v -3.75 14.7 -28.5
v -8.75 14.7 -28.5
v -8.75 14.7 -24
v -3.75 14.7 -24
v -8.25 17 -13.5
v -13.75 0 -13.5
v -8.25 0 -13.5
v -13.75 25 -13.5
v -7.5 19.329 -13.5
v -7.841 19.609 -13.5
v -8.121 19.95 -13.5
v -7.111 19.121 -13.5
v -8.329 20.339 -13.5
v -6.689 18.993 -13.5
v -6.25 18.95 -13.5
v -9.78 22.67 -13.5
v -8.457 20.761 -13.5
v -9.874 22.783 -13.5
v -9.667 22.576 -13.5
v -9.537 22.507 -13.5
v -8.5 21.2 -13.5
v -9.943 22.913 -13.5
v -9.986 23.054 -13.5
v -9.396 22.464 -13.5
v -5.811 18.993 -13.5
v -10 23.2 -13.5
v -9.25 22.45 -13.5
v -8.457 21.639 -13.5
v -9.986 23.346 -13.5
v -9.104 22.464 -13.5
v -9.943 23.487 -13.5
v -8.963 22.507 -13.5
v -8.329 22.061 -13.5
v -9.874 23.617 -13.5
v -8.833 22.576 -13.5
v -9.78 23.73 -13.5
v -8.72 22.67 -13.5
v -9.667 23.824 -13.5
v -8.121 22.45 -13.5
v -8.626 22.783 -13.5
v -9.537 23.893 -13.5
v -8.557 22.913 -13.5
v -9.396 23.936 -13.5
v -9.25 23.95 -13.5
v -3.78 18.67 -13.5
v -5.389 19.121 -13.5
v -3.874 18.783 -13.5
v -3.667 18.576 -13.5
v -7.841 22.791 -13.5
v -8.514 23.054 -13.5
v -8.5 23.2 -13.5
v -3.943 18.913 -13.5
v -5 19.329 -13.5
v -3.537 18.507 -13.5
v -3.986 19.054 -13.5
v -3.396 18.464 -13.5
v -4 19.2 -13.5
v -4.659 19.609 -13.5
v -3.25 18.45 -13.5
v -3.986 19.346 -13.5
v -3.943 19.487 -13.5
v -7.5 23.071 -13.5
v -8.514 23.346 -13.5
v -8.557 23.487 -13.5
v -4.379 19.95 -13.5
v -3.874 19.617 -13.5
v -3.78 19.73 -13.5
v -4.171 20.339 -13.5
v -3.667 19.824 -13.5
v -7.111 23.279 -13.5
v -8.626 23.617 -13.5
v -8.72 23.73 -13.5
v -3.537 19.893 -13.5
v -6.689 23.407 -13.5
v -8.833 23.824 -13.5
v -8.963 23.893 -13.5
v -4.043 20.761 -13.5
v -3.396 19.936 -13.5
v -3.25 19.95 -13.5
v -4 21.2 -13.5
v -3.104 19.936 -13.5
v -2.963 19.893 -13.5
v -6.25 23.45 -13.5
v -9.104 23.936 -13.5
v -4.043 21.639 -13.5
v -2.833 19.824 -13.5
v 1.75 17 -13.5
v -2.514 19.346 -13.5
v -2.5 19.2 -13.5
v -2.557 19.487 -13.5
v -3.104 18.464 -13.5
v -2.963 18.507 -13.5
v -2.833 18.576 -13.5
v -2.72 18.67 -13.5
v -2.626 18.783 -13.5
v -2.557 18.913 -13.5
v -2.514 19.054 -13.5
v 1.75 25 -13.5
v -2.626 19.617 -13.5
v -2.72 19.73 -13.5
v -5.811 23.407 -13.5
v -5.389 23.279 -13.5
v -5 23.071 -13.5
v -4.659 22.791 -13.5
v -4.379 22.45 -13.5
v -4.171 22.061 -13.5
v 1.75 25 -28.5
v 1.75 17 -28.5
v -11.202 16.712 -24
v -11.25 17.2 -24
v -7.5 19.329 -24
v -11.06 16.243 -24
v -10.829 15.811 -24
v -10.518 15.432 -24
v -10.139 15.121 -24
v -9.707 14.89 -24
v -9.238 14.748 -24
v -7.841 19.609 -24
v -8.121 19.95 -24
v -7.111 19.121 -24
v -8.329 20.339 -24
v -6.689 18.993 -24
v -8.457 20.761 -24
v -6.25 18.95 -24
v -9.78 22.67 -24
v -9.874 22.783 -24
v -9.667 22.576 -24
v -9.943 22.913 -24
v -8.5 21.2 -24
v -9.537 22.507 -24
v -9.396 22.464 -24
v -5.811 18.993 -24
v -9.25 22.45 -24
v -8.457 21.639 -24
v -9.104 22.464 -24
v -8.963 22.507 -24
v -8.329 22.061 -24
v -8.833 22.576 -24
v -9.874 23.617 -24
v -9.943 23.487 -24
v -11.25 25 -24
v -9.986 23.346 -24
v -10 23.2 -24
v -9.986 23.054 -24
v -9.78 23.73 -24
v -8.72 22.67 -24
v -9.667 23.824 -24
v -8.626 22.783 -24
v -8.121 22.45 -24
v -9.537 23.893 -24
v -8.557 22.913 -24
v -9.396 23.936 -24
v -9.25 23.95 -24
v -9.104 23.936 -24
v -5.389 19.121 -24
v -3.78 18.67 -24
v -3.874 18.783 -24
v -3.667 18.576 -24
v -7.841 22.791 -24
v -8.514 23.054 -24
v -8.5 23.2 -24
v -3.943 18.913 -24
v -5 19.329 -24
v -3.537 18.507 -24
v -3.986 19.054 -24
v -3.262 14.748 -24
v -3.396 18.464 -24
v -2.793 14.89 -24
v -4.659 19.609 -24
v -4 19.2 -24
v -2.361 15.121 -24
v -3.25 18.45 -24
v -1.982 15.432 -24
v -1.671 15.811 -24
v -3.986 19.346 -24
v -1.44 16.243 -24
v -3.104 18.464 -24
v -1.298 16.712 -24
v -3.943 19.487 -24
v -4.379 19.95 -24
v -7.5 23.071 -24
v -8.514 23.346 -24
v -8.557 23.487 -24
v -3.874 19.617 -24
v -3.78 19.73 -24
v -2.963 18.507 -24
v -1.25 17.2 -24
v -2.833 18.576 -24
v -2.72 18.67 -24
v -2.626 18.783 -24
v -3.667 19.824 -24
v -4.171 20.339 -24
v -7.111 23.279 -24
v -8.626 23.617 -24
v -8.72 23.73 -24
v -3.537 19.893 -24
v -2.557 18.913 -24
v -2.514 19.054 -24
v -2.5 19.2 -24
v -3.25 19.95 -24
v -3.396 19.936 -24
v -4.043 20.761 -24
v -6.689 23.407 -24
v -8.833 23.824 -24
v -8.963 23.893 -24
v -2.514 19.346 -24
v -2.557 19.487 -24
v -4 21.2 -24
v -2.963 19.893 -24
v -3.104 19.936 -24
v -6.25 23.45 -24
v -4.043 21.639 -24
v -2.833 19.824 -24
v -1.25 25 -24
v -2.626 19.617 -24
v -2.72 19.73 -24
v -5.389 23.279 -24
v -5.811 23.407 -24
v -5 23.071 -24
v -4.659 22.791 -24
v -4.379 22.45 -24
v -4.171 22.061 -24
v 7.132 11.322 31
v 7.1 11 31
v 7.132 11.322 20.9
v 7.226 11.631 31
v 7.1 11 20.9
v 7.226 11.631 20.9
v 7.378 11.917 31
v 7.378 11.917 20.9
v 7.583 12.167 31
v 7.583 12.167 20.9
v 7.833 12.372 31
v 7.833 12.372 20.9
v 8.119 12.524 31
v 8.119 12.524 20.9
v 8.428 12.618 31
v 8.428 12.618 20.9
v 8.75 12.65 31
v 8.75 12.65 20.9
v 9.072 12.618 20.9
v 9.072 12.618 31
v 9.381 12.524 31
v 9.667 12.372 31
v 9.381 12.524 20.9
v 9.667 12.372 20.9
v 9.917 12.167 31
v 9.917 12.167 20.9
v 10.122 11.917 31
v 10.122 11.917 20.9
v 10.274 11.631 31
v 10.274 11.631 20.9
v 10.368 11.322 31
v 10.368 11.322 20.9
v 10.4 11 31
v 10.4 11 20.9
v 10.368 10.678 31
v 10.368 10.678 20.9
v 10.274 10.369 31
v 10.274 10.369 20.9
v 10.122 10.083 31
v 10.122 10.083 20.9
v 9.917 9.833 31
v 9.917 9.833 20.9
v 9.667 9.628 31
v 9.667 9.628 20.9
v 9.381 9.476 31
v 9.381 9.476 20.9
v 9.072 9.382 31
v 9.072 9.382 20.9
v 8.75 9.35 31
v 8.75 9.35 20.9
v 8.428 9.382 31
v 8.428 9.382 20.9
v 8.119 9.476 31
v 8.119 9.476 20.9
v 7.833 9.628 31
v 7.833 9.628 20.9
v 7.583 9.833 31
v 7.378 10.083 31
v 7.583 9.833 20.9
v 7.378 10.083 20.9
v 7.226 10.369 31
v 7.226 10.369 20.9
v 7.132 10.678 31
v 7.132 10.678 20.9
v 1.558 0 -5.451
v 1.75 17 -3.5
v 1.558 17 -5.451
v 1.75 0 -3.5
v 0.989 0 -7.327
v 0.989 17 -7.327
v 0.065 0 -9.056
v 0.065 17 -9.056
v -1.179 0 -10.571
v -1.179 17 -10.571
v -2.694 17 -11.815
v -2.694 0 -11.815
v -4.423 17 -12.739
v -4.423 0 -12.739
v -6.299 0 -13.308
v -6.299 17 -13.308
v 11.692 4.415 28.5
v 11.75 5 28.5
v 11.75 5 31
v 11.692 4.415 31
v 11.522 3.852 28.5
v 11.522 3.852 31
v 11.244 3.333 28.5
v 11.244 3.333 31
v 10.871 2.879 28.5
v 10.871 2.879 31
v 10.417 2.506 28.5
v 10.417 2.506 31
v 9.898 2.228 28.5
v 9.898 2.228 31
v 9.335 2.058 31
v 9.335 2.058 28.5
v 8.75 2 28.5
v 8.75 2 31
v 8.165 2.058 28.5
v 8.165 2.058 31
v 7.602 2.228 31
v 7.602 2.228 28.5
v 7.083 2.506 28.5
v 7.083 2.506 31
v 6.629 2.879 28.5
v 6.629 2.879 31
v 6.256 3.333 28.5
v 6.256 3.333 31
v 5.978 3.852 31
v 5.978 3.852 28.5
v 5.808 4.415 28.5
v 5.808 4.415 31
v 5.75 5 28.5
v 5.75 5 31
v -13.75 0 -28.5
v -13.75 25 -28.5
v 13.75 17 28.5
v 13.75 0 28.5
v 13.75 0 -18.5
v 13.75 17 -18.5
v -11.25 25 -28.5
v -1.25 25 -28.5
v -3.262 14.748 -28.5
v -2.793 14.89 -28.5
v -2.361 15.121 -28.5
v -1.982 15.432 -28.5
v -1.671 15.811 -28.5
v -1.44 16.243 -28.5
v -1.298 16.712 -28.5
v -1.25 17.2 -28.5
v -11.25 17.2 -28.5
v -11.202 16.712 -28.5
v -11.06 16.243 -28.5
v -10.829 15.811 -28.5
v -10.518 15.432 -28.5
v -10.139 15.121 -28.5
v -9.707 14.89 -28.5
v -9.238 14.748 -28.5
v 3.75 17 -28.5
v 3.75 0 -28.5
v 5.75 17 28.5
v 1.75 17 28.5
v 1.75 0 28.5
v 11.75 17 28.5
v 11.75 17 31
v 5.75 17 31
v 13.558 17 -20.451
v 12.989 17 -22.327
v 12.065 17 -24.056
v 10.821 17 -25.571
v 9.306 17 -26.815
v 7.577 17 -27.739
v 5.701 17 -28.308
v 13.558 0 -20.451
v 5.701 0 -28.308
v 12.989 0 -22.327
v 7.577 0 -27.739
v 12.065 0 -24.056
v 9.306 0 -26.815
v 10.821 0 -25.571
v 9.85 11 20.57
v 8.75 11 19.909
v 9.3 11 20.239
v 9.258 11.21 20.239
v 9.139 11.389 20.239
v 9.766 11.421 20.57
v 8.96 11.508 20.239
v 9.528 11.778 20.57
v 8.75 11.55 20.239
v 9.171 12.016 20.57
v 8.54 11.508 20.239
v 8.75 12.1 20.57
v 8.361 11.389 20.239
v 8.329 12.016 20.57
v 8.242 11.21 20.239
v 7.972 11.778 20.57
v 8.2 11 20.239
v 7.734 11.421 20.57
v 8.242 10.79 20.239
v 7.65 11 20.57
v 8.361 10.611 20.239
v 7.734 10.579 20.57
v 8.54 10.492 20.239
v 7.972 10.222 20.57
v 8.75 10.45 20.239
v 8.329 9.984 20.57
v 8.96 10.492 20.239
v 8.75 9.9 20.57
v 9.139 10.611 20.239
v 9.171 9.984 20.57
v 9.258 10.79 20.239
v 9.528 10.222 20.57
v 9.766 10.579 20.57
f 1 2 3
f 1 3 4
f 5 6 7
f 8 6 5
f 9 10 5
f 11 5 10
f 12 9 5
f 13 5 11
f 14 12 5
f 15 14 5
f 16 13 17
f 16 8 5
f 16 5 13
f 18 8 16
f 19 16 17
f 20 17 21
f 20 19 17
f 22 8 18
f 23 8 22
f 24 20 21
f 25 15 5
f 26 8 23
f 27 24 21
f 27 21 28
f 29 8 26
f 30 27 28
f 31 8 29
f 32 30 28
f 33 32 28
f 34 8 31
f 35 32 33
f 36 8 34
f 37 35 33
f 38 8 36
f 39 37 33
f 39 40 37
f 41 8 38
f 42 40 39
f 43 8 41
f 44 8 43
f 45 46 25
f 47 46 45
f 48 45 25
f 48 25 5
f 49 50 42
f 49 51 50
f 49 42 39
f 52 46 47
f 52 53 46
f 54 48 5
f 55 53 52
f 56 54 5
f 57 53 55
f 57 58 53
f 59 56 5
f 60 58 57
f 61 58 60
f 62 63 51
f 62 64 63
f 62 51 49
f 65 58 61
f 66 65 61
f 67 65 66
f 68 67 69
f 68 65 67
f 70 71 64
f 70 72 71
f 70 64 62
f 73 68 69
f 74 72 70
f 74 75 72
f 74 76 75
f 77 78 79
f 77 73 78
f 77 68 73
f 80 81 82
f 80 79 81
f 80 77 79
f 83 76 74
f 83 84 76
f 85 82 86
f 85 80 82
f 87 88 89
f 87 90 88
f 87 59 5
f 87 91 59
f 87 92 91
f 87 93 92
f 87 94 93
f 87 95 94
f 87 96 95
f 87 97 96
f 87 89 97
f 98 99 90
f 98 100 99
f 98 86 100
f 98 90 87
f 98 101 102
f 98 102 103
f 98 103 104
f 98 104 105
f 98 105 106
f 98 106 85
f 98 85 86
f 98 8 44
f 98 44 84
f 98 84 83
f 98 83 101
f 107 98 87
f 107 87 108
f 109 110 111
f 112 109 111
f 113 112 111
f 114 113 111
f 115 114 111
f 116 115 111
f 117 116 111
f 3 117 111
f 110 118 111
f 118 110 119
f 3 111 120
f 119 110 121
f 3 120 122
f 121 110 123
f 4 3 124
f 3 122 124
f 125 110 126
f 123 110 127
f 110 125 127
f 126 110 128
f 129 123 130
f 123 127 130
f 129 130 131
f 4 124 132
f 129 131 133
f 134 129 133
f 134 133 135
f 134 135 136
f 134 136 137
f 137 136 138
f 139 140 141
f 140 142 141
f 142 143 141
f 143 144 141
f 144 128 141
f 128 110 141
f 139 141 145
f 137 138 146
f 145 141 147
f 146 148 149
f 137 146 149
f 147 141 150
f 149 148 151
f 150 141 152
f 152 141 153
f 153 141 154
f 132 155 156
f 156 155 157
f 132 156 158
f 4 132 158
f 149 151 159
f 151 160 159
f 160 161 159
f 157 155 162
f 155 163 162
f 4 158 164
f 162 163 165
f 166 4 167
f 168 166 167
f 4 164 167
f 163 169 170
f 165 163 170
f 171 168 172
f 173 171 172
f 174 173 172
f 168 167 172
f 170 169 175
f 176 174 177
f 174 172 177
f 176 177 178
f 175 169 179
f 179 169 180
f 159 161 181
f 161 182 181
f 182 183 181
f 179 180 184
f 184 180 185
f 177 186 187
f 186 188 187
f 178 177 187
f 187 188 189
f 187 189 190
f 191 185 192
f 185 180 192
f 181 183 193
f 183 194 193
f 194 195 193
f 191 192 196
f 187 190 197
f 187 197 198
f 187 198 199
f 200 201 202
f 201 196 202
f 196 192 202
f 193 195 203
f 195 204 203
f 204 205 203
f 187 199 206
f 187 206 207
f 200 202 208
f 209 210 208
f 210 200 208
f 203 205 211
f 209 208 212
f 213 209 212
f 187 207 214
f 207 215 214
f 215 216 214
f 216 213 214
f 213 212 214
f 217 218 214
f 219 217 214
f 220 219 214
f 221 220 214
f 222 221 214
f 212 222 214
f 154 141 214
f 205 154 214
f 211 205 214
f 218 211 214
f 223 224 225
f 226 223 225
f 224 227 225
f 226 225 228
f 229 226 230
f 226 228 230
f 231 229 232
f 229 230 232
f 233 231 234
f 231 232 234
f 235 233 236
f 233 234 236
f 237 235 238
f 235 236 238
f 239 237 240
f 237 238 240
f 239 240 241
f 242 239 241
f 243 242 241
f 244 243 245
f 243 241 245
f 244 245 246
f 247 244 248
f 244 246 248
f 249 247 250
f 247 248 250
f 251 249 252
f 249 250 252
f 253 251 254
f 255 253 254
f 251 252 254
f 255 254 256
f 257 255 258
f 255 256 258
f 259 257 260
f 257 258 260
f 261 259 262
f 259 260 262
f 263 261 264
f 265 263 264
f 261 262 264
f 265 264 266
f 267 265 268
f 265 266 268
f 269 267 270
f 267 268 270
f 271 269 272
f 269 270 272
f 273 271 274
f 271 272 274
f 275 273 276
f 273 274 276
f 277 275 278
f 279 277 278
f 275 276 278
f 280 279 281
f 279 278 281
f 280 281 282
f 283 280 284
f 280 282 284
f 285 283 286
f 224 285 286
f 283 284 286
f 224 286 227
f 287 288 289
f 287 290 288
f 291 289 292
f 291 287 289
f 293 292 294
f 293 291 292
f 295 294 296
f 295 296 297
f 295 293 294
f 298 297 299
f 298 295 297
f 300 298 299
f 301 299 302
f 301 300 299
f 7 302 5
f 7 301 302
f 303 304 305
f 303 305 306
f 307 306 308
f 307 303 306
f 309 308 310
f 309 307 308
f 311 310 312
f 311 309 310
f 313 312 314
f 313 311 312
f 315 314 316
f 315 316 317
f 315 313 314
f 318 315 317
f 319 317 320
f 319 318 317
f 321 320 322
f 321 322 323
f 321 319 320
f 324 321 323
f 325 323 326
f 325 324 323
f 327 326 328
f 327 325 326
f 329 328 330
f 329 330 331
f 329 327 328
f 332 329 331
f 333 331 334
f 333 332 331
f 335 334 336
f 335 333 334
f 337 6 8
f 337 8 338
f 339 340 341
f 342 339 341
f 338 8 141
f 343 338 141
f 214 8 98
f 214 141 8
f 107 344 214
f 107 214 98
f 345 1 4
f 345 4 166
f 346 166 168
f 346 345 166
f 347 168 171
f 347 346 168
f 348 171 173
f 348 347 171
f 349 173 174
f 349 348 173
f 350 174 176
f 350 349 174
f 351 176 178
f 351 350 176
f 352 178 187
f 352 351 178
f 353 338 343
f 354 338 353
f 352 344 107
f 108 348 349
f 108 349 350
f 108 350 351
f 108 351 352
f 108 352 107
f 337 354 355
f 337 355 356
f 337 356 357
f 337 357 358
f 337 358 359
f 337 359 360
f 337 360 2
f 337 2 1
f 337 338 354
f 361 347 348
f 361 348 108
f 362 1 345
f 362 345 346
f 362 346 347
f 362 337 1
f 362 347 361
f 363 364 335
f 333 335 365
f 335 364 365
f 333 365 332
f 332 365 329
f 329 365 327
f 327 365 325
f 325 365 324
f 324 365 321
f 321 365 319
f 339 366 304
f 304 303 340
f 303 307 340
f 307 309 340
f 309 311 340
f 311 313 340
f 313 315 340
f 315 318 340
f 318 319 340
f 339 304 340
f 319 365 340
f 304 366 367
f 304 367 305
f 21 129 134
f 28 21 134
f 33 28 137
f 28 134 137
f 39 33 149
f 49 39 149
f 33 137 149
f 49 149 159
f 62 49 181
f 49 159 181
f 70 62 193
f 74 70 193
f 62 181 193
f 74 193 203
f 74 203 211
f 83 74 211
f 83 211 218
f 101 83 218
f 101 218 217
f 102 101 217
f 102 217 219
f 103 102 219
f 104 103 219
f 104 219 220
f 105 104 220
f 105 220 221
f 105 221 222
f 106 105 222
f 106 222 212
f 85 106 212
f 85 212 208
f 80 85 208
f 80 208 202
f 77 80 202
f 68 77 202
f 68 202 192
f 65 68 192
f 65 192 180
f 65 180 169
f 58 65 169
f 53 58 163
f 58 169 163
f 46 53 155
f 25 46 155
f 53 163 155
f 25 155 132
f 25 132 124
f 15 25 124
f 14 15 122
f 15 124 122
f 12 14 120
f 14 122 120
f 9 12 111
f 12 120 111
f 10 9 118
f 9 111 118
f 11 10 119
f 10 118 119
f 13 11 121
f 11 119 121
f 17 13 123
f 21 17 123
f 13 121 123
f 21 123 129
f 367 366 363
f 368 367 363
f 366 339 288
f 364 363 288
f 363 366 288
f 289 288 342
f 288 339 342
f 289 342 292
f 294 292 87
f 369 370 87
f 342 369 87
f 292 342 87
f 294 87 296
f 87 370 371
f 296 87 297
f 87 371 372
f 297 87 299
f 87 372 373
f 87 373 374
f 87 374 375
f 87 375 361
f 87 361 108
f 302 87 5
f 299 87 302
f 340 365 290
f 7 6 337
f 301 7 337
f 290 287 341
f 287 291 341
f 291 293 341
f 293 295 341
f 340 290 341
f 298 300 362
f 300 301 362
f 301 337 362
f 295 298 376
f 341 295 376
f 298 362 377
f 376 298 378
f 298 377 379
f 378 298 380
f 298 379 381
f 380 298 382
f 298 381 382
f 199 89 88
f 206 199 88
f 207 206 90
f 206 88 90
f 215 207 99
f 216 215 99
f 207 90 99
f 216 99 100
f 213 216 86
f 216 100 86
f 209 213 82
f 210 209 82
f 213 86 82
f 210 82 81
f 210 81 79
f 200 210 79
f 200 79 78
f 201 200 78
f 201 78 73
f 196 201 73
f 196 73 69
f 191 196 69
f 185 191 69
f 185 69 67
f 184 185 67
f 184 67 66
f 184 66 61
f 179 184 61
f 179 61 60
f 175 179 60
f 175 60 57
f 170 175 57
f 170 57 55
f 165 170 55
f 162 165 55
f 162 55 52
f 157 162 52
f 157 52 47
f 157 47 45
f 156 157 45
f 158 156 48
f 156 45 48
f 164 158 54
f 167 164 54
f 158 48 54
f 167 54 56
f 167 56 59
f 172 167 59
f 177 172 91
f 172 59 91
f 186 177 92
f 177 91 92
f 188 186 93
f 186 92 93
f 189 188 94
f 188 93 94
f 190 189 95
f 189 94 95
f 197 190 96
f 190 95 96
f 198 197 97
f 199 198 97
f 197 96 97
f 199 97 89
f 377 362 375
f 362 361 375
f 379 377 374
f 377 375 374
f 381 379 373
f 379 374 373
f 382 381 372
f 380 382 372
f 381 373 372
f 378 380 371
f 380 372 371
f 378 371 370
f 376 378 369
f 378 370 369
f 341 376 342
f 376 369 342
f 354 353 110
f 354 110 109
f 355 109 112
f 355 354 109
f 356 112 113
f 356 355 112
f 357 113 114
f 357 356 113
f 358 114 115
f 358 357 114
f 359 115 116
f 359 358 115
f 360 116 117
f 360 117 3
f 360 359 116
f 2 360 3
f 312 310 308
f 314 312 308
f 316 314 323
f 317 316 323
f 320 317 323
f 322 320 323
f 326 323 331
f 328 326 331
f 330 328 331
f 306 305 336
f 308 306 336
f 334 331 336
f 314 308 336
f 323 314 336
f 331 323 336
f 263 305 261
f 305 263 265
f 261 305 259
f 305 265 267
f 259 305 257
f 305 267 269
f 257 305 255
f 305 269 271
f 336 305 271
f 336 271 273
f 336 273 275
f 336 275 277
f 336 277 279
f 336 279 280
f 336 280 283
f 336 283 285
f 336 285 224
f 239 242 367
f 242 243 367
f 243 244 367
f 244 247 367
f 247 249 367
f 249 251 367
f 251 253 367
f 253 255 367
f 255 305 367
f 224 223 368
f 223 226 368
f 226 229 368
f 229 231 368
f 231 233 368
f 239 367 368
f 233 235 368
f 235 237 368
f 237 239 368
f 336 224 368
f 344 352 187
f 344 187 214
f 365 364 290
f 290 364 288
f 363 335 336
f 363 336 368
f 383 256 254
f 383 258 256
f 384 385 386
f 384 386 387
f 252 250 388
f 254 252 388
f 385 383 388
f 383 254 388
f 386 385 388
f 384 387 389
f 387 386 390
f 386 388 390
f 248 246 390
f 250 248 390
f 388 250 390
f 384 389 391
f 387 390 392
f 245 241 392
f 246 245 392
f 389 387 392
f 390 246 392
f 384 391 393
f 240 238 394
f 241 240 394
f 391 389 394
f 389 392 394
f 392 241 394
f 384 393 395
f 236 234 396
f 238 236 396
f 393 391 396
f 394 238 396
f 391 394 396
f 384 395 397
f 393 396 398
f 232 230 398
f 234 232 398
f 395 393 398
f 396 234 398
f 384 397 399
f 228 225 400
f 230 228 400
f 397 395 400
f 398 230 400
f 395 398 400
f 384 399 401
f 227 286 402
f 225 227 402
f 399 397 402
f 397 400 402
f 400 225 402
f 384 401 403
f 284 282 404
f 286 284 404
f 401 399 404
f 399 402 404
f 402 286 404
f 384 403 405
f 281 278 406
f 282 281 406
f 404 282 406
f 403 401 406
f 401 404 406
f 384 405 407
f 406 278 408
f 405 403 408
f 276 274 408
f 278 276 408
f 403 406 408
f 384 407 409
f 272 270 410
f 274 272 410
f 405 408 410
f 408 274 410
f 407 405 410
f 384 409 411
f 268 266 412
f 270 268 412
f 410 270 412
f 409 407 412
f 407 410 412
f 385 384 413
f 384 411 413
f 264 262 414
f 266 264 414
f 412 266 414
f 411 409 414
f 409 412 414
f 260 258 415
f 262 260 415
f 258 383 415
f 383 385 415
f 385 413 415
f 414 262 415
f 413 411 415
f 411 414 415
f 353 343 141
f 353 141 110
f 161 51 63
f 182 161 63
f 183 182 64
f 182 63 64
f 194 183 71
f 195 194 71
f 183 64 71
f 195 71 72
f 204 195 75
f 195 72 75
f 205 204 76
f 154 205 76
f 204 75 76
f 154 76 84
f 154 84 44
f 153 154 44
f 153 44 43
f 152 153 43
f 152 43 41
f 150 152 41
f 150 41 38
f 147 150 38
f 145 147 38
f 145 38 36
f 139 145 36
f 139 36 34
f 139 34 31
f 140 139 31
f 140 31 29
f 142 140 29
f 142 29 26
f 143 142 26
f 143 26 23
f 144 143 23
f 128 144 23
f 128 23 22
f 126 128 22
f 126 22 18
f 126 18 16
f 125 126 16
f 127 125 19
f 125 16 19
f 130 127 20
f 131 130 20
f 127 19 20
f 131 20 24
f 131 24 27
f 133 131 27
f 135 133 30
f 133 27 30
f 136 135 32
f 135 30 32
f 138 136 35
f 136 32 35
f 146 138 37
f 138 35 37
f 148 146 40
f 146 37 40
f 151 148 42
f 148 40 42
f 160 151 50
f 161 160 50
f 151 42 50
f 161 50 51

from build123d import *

# Parameters (mm, degrees)
SKETCH1_W                 = 27.5
SKETCH1_H                 = 57
BOSS_EXTRUDE1_DEPTH       = 25
BOSS_EXTRUDE2_DEPTH       = 2.5
CUT_EXTRUDE1_DEPTH        = 4.5
M4X0_7_TAPPED_HOLE1_D     = 3.3
M4X0_7_TAPPED_HOLE1_DEPTH = 10.1
M4X0_7_TAPPED_HOLE1_TIP   = 0.991420021
CUT_EXTRUDE2_DEPTH        = 8
M4_CLEARANCE_HOLE1_D      = 4.5
F_1_5MM_DOWEL_HOLE1_D     = 1.5
SKETCH11_W                = 15.5
SKETCH11_H                = 42
CUT_EXTRUDE3_DEPTH        = 38.934977264
FILLET1_R                 = 10


with BuildPart() as part:
    # Sketch1 → Boss-Extrude1 (new body)
    with BuildSketch(Plane(origin=(0, 0, 0), x_dir=(1, 0, 0), z_dir=(0, 1, 0))):
        Rectangle(SKETCH1_W, SKETCH1_H)
    extrude(amount=BOSS_EXTRUDE1_DEPTH)

    # Sketch2 → Boss-Extrude2 (add)
    with BuildSketch(Plane.XY.offset(28.5)):
        with BuildLine():
            Line((5.75, 5), (5.75, 25))
            Line((5.75, 25), (11.75, 25))
            Line((11.75, 25), (11.75, 5))
            ThreePointArc((11.75, 5), (8.75, 2), (5.75, 5))
        make_face()
    extrude(amount=BOSS_EXTRUDE2_DEPTH)

    # Sketch3 → Cut-Extrude1 (cut)
    with BuildSketch(Plane(origin=(0, 0, -28.5), x_dir=(-1, 0, 0), z_dir=(0, 0, -1))):
        with BuildLine():
            Line((1.25, 25), (11.25, 25))
            Line((11.25, 25), (11.25, 17.2))
            ThreePointArc((11.25, 17.2), (10.517766953, 15.432233047), (8.75, 14.7))
            Line((8.75, 14.7), (3.75, 14.7))
            ThreePointArc((3.75, 14.7), (1.982233047, 15.432233047), (1.25, 17.2))
            Line((1.25, 17.2), (1.25, 25))
        make_face()
    extrude(amount=-CUT_EXTRUDE1_DEPTH, mode=Mode.SUBTRACT)

    # M4x0.7 Tapped Hole1
    with Locations(Plane.XY.offset(31)):
        with Locations((8.75, 11)):
            Hole(M4X0_7_TAPPED_HOLE1_D / 2, depth=M4X0_7_TAPPED_HOLE1_DEPTH)
            with Locations((0, 0, -(M4X0_7_TAPPED_HOLE1_DEPTH + M4X0_7_TAPPED_HOLE1_TIP / 2))):  # 118° drill point
                Cone(0, M4X0_7_TAPPED_HOLE1_D / 2, M4X0_7_TAPPED_HOLE1_TIP, mode=Mode.SUBTRACT)

    # Sketch6 → Cut-Extrude2 (cut)
    with BuildSketch(Plane(origin=(0, 25, 0), x_dir=(1, 0, 0), z_dir=(0, 1, 0))):
        Polygon((-13.75, 13.5), (1.75, 13.5), (1.75, 28.5), (13.75, 28.5), (13.75, 0), (13.75, -28.5), (11.75, -28.5), (11.75, -31), (5.75, -31), (5.75, -28.5), (-13.75, -28.5), align=None)
    extrude(amount=-CUT_EXTRUDE2_DEPTH, mode=Mode.SUBTRACT)

    # M4 Clearance Hole1 (through all)
    with Locations(Plane.XY.offset(-13.5)):
        with Locations((-6.25, 21.2)):
            Hole(M4_CLEARANCE_HOLE1_D / 2)

    # Ø1.5mm Dowel Hole1 (through all)
    with Locations(Plane(origin=(0, 0, -24), x_dir=(-1, 0, 0), z_dir=(0, 0, -1))):
        with Locations((9.25, 23.2), (3.25, 19.2)):
            Hole(F_1_5MM_DOWEL_HOLE1_D / 2)

    # Sketch11 → Cut-Extrude3 (cut, through all)
    with BuildSketch(Plane(origin=(0, 17, 0), x_dir=(1, 0, 0), z_dir=(0, 1, 0))):
        with Locations((-6, -7.5)):
            Rectangle(SKETCH11_W, SKETCH11_H)
    extrude(amount=-CUT_EXTRUDE3_DEPTH, mode=Mode.SUBTRACT)

    # Fillet1
    fillet1_edges = [part.edges().sort_by_distance(p)[0] for p in [
        (1.75, 8.5, -13.5),
        (13.75, 8.5, -28.5),
    ]]
    fillet(fillet1_edges, radius=FILLET1_R)


solid = part.part
